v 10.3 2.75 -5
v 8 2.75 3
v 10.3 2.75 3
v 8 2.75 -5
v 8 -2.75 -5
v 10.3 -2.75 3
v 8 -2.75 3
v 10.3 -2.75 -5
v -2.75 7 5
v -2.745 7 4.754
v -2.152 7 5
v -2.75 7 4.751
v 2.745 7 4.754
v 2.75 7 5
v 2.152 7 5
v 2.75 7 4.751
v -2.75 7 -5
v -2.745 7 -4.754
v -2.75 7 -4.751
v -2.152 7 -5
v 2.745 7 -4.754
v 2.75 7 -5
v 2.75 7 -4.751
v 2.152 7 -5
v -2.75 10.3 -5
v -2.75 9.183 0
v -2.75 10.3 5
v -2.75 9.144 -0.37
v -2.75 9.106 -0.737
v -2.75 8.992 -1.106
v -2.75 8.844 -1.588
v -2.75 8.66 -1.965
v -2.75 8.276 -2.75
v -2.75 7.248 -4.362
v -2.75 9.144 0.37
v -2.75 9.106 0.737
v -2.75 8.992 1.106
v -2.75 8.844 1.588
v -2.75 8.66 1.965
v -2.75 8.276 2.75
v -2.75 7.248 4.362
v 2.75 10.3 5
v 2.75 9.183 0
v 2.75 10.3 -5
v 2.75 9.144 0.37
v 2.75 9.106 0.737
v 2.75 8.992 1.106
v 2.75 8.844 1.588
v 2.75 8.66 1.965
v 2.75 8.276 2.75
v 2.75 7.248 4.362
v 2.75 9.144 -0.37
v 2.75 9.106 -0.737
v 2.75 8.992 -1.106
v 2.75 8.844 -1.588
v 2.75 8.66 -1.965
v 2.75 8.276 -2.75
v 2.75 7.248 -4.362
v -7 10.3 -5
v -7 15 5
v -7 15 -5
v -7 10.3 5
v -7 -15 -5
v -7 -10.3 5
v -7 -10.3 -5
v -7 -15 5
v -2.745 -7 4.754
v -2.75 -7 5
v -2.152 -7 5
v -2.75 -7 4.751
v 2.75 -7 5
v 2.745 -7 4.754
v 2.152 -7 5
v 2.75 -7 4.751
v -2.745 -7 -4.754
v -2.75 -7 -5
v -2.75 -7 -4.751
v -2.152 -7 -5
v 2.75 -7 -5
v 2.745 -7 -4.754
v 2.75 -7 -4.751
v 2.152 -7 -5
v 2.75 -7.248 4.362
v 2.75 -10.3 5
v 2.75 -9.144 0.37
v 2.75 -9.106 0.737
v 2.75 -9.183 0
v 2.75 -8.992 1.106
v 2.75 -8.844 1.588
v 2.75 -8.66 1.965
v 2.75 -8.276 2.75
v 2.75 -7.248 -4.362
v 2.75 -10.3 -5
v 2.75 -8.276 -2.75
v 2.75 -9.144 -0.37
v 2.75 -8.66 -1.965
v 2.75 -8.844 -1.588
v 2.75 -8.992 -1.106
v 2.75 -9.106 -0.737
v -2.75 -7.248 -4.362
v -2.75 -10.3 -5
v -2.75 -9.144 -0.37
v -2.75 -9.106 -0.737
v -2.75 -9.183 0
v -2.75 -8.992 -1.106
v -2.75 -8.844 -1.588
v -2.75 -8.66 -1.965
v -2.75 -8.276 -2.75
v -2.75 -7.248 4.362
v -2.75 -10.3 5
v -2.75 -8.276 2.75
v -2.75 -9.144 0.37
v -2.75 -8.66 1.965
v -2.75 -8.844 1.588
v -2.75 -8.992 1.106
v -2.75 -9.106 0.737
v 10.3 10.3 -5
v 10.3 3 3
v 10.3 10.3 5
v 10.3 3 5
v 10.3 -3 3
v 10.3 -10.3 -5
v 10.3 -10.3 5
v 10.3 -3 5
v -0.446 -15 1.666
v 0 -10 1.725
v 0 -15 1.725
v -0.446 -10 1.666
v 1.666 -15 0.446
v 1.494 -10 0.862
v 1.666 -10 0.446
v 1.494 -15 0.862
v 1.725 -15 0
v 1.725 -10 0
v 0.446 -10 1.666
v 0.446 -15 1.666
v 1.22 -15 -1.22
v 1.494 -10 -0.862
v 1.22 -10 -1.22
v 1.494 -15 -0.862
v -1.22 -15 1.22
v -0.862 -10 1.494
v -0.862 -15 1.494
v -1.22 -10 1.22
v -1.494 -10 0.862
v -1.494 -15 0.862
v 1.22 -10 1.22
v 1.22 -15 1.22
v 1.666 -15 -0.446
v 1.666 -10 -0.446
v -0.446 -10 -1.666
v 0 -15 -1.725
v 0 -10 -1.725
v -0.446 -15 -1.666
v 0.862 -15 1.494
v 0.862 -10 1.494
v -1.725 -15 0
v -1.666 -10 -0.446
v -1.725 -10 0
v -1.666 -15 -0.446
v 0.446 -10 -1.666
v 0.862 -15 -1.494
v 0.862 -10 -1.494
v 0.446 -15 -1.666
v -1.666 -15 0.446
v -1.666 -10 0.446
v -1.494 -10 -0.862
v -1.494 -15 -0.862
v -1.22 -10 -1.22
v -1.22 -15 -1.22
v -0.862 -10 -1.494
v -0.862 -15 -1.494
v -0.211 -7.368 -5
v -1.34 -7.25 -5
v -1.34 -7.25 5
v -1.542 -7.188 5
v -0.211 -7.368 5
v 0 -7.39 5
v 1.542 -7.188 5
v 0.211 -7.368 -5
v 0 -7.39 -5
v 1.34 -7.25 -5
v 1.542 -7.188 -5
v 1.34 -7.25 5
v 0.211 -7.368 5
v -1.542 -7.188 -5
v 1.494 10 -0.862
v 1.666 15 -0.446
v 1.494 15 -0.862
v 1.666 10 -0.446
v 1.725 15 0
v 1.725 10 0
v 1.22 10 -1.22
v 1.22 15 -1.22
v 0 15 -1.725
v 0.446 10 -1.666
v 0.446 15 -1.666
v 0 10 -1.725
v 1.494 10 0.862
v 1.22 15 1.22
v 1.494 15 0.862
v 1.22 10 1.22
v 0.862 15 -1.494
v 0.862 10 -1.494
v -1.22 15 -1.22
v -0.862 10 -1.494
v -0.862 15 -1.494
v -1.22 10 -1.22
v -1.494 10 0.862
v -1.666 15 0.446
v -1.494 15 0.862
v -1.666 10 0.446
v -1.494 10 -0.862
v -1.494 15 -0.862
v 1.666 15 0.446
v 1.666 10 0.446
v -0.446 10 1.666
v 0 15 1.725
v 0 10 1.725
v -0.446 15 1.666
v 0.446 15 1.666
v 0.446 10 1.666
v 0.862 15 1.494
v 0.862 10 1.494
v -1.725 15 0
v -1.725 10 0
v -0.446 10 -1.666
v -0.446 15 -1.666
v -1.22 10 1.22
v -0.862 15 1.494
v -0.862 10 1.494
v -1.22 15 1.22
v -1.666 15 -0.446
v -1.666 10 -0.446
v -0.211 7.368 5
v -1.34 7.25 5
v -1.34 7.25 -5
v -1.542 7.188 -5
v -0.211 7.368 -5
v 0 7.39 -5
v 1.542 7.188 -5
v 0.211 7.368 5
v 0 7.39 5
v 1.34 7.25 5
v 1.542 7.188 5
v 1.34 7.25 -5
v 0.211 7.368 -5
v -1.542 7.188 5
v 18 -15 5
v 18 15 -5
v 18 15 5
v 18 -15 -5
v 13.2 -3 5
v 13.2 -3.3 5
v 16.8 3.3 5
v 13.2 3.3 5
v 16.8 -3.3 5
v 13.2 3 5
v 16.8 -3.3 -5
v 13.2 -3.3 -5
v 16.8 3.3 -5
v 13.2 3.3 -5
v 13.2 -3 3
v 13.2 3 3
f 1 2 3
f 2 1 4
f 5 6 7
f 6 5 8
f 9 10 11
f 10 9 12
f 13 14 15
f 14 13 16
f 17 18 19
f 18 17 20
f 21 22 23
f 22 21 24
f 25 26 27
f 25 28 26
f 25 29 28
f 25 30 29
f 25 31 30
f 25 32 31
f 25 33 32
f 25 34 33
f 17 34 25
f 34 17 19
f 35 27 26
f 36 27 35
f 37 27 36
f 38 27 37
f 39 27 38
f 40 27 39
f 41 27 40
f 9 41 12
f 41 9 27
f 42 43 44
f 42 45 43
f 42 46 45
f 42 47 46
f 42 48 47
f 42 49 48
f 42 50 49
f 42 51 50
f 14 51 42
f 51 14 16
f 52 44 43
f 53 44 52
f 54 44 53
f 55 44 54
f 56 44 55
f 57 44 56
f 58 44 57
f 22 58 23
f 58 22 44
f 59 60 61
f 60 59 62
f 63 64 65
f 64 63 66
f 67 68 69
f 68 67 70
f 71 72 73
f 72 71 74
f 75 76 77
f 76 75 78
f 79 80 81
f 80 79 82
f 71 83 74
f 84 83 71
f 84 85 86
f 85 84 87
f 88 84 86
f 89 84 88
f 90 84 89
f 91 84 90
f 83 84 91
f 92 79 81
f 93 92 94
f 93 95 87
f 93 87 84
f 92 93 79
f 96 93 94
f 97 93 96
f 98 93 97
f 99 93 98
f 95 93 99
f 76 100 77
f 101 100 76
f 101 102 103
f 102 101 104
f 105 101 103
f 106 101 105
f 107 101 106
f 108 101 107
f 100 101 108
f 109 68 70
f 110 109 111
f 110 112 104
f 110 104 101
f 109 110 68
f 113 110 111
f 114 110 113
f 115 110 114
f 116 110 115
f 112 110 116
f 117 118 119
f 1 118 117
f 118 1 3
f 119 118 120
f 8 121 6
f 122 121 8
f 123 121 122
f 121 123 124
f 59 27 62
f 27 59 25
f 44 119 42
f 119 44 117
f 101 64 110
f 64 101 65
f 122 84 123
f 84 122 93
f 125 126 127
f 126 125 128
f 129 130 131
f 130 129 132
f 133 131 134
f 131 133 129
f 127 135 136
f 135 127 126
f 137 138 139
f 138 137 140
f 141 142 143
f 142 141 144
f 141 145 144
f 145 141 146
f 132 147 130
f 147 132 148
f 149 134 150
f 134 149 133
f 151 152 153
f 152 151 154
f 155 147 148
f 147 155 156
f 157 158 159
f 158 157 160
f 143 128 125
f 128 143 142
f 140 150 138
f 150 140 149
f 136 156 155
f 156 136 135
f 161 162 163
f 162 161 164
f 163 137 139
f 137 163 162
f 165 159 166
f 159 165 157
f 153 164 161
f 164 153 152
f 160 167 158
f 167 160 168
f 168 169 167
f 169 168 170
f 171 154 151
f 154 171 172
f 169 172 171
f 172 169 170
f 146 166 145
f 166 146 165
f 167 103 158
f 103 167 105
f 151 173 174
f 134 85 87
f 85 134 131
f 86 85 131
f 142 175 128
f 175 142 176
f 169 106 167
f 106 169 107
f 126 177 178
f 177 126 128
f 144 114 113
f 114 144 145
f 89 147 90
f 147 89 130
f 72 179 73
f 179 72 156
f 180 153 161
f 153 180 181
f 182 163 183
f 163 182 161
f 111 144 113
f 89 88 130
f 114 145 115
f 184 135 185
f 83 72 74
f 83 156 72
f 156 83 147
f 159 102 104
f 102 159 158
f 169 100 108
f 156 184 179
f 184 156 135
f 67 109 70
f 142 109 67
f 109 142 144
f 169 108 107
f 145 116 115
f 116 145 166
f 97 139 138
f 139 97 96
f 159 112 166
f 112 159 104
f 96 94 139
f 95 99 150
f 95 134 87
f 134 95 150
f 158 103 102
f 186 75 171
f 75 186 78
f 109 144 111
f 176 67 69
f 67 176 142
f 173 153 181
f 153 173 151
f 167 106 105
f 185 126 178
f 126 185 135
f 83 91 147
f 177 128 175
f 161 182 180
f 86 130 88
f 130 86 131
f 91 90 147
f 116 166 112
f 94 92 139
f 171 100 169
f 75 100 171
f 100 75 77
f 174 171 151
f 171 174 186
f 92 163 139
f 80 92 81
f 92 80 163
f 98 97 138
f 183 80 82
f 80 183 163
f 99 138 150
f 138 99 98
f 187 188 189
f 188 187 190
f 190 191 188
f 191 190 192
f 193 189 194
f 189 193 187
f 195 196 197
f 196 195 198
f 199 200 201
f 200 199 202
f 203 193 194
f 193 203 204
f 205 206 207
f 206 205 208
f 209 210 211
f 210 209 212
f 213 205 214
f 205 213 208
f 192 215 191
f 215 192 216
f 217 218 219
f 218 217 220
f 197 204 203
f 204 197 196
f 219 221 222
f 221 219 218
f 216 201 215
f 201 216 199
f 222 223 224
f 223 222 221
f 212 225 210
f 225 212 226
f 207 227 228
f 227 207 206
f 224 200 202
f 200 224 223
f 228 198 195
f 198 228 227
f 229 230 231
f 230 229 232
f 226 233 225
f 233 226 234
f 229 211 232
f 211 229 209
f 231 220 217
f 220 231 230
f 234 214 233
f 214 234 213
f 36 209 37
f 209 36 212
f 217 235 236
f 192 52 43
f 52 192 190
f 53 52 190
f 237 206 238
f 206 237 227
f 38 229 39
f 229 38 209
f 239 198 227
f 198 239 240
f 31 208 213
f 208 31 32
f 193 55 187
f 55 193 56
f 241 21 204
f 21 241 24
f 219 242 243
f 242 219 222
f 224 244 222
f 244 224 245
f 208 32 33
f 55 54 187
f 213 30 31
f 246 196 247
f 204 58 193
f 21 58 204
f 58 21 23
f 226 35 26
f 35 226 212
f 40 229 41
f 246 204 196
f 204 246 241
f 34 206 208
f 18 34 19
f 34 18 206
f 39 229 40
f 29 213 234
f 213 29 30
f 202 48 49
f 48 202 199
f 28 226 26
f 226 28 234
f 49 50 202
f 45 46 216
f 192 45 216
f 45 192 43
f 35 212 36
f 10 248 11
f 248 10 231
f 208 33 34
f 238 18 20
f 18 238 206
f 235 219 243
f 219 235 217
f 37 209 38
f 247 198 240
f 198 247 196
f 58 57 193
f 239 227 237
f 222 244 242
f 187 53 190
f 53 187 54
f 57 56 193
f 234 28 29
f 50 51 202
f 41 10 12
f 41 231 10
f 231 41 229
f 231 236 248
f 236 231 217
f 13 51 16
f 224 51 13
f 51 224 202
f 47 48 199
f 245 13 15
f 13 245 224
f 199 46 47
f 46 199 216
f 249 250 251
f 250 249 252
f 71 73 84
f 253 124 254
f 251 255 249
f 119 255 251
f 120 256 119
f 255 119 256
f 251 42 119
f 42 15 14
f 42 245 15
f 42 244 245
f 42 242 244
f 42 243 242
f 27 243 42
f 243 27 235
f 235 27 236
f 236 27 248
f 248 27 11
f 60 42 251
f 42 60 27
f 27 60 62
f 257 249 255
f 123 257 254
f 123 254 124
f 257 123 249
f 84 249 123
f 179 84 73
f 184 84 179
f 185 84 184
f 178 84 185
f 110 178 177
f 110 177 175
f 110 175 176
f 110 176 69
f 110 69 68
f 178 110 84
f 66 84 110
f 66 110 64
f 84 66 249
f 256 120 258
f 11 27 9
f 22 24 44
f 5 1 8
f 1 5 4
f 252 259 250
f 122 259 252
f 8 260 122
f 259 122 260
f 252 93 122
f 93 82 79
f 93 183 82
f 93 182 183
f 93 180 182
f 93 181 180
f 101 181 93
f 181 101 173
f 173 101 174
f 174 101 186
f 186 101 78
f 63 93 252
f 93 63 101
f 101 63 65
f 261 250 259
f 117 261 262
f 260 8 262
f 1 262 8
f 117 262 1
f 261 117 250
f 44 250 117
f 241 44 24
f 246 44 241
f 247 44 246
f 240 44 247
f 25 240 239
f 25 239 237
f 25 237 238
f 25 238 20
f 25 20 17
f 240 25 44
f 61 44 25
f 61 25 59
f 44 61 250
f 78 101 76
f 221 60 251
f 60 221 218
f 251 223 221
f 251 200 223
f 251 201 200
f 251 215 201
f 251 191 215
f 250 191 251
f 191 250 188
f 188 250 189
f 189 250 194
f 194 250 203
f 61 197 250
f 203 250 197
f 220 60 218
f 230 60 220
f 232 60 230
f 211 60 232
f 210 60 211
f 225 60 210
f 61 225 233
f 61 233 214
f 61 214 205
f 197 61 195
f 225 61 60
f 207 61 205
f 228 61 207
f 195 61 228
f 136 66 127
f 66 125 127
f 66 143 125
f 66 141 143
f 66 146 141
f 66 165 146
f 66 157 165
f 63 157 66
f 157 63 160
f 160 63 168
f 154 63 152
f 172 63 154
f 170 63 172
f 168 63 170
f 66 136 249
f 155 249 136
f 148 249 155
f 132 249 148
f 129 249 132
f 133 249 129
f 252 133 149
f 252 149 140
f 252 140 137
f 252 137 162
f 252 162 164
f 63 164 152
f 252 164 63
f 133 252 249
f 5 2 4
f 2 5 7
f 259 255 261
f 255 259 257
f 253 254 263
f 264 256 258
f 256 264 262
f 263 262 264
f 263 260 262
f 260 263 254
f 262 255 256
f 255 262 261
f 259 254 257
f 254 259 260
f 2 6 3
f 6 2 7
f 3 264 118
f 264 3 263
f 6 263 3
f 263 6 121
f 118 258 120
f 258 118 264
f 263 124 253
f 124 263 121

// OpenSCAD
// file: configuration.scad
// Increase this if your slicer or printer make holes too tight.
extra_radius = 0.30;

// OD = outside diameter, corner to corner.
//六角螺母
m3_nut_od = 6.1;
m3_nut_radius = m3_nut_od/2 + 0.2 + extra_radius;
m4_nut_od = 8;
m4_nut_radius = m4_nut_od/2 + 0.2 +extra_radius;
m3_nut_height = 2.4;
m4_nut_height = 3.2;

// Major diameter of metric 3mm thread.
m3_major = 2.85;
m3_radius = m3_major/2 + extra_radius;
m3_wide_radius = m3_major/2 + extra_radius + 0.2;

// NEMA17 stepper motors.
motor_shaft_diameter = 5;
motor_shaft_radius = motor_shaft_diameter/2 + extra_radius;

// Frame brackets. M3x8mm screws work best with 3.6 mm brackets.
thickness = 3.6;

// OpenBeam or Misumi. Currently only 15x15 mm, but there is a plan
// to make models more parametric and allow 20x20 mm in the future.
//extrusion = 15;
extrusion = 20;
//extrusion_block_width = 2.5; //15x15
extrusion_block_width = 6.1; //20x20

//corner_radius = 36; //15x15
corner_radius = 40; //20x20

//extrusion_offset = 0;//15x15
extrusion_offset = -2.5; //20x20

//height_offset = 0; //15x15
height_offset = -extrusion_offset; //20x20

//screw_offset=-7.5; //15x15
screw_offset=-12; //20x20
// file: vertex.scad
include <configuration.scad>;

$fn = 24;
roundness = 6;

module extrusion_cutout(h, extra) {
 	 difference() {
    cube([extrusion+extra, extrusion+extra, h], center=true);
    for (a = [0:90:359]) rotate([0, 0, a]) {
      translate([extrusion/2, 0, 0])
        cube([6, extrusion_block_width-extra, h+1], center=true);
    }
  }
}

module screw_socket() {
  cylinder(r=m3_wide_radius, h=20, center=true);
  translate([0, 0, 3.8]) cylinder(r=3.5, h=5);
}

module screw_socket_cone() {
  union() {
    screw_socket();
    scale([1, 1, -1]) cylinder(r1=4, r2=7, h=4);
  }
}

module vertex(height, idler_offset, idler_space) {
  union() {
    // Pads to improve print bed adhesion for slim ends.
   // translate([-37.5, 52.2, -height/2]) cylinder(r=8, h=0.5);
   // translate([37.5, 52.2, -height/2]) cylinder(r=8, h=0.5);
    difference() {
      union() {
        intersection() {
          translate([0, 22, 0])
            cylinder(r=corner_radius, h=height, center=true, $fn=60);
          translate([0, -37+6, 0]) rotate([0, 0, 30])
            cylinder(r=50, h=height+1, center=true, $fn=6);
        }
        translate([0, 38, 0]) intersection() {
          rotate([0, 0, -90])
            cylinder(r=55, h=height, center=true, $fn=3);
          translate([0, 10, 0])
            cube([100, 100, 2*height], center=true);
          translate([0, -10, 0]) rotate([0, 0, 30])
            cylinder(r=55, h=height+1, center=true, $fn=6);
        }
      }
      difference() {
        translate([0, 58, 0]) minkowski() {
          intersection() {
            rotate([0, 0, -90])
              cylinder(r=55, h=height, center=true, $fn=3);
            translate([0, -32, 0])
              cube([100, 16, 2*height], center=true);
          }
          cylinder(r=roundness, h=1, center=true);
        }
        // Idler support cones.
        translate([0, 26+idler_offset-30, 0]) rotate([-90, 0, 0])
          cylinder(r1=30, r2=2, h=30-idler_space/2);
        translate([0, 26+idler_offset+30, 0]) rotate([90, 0, 0])
          cylinder(r1=30, r2=2, h=30-idler_space/2);
      }
      translate([0, 58, 0]) minkowski() {
        intersection() {
          rotate([0, 0, -90])
            cylinder(r=55, h=height, center=true, $fn=3);
          translate([0, 7, 0])
            cube([100, 30, 2*height], center=true);
        }
        cylinder(r=roundness, h=1, center=true);
      }
      translate([0,extrusion_offset,0])extrusion_cutout(height+10, 2*extra_radius);
      for (z = [0:24:height]) {
        translate([0, -12-extra_radius, z+7.5-height/2+2.5]) rotate([90, 0, 0])
          screw_socket_cone();
        for (a = [-1, 1]) {
          rotate([0, 0, 30*a]) translate([-16*a, 111, z+7.5-height/2+2.5]) {
            // % rotate([90, 0, 0]) extrusion_cutout(200, 0);
            // Screw sockets.
            for (y = [-88, -44]) {
              translate([a*7.5, y, 0]) rotate([0, a*90, 0]) screw_socket();
            }
            // Nut tunnels.
		    for (z = [-1, 1]) {
		      scale([1, 1, z]) translate([-2.5*a, -100, 4]) minkowski() {
		        rotate([0, 0, -a*30]) cylinder(r=3, h=16, $fn=6);
				cube([0.1, 8, 0.1], center=true);
		      }
            }//for
          }//rotate
        }//for(a=[-1,1])
      }
    }
  }
}

//translate([0, 0, 7.5]) vertex(2.2*20, idler_offset=0, idler_space=10);

//translate([0, 0, 35]) vertex(15, idler_offset=0, idler_space=10);
// main file
include <vertex.scad>

module endstop(h,offset=2,outer=1)
{
	difference()
	{
		translate([-7,-15,-h/2])cube([19+3+outer+offset,30,h]);
		extrusion_cutout(2*h,2*extra_radius);
		cube([16,6,h],center=true);
		for(a=[1,-1])
		{
			translate([0,-6*a,0])
				rotate([90*a,0,0])
					cylinder(r=m3_radius,h=10);
			translate([0,-5*a,0])
			rotate([90*a,0,0])
			cylinder(r1=8,r2=m3_radius,h=5);
		}
		translate([13+offset,0,0])cube([3+2*extra_radius,6+2*extra_radius,h],center=true);
#		translate([2+offset,-3,h/2-2])cube([10,6,5]);
	}
}

endstop(h=10);
